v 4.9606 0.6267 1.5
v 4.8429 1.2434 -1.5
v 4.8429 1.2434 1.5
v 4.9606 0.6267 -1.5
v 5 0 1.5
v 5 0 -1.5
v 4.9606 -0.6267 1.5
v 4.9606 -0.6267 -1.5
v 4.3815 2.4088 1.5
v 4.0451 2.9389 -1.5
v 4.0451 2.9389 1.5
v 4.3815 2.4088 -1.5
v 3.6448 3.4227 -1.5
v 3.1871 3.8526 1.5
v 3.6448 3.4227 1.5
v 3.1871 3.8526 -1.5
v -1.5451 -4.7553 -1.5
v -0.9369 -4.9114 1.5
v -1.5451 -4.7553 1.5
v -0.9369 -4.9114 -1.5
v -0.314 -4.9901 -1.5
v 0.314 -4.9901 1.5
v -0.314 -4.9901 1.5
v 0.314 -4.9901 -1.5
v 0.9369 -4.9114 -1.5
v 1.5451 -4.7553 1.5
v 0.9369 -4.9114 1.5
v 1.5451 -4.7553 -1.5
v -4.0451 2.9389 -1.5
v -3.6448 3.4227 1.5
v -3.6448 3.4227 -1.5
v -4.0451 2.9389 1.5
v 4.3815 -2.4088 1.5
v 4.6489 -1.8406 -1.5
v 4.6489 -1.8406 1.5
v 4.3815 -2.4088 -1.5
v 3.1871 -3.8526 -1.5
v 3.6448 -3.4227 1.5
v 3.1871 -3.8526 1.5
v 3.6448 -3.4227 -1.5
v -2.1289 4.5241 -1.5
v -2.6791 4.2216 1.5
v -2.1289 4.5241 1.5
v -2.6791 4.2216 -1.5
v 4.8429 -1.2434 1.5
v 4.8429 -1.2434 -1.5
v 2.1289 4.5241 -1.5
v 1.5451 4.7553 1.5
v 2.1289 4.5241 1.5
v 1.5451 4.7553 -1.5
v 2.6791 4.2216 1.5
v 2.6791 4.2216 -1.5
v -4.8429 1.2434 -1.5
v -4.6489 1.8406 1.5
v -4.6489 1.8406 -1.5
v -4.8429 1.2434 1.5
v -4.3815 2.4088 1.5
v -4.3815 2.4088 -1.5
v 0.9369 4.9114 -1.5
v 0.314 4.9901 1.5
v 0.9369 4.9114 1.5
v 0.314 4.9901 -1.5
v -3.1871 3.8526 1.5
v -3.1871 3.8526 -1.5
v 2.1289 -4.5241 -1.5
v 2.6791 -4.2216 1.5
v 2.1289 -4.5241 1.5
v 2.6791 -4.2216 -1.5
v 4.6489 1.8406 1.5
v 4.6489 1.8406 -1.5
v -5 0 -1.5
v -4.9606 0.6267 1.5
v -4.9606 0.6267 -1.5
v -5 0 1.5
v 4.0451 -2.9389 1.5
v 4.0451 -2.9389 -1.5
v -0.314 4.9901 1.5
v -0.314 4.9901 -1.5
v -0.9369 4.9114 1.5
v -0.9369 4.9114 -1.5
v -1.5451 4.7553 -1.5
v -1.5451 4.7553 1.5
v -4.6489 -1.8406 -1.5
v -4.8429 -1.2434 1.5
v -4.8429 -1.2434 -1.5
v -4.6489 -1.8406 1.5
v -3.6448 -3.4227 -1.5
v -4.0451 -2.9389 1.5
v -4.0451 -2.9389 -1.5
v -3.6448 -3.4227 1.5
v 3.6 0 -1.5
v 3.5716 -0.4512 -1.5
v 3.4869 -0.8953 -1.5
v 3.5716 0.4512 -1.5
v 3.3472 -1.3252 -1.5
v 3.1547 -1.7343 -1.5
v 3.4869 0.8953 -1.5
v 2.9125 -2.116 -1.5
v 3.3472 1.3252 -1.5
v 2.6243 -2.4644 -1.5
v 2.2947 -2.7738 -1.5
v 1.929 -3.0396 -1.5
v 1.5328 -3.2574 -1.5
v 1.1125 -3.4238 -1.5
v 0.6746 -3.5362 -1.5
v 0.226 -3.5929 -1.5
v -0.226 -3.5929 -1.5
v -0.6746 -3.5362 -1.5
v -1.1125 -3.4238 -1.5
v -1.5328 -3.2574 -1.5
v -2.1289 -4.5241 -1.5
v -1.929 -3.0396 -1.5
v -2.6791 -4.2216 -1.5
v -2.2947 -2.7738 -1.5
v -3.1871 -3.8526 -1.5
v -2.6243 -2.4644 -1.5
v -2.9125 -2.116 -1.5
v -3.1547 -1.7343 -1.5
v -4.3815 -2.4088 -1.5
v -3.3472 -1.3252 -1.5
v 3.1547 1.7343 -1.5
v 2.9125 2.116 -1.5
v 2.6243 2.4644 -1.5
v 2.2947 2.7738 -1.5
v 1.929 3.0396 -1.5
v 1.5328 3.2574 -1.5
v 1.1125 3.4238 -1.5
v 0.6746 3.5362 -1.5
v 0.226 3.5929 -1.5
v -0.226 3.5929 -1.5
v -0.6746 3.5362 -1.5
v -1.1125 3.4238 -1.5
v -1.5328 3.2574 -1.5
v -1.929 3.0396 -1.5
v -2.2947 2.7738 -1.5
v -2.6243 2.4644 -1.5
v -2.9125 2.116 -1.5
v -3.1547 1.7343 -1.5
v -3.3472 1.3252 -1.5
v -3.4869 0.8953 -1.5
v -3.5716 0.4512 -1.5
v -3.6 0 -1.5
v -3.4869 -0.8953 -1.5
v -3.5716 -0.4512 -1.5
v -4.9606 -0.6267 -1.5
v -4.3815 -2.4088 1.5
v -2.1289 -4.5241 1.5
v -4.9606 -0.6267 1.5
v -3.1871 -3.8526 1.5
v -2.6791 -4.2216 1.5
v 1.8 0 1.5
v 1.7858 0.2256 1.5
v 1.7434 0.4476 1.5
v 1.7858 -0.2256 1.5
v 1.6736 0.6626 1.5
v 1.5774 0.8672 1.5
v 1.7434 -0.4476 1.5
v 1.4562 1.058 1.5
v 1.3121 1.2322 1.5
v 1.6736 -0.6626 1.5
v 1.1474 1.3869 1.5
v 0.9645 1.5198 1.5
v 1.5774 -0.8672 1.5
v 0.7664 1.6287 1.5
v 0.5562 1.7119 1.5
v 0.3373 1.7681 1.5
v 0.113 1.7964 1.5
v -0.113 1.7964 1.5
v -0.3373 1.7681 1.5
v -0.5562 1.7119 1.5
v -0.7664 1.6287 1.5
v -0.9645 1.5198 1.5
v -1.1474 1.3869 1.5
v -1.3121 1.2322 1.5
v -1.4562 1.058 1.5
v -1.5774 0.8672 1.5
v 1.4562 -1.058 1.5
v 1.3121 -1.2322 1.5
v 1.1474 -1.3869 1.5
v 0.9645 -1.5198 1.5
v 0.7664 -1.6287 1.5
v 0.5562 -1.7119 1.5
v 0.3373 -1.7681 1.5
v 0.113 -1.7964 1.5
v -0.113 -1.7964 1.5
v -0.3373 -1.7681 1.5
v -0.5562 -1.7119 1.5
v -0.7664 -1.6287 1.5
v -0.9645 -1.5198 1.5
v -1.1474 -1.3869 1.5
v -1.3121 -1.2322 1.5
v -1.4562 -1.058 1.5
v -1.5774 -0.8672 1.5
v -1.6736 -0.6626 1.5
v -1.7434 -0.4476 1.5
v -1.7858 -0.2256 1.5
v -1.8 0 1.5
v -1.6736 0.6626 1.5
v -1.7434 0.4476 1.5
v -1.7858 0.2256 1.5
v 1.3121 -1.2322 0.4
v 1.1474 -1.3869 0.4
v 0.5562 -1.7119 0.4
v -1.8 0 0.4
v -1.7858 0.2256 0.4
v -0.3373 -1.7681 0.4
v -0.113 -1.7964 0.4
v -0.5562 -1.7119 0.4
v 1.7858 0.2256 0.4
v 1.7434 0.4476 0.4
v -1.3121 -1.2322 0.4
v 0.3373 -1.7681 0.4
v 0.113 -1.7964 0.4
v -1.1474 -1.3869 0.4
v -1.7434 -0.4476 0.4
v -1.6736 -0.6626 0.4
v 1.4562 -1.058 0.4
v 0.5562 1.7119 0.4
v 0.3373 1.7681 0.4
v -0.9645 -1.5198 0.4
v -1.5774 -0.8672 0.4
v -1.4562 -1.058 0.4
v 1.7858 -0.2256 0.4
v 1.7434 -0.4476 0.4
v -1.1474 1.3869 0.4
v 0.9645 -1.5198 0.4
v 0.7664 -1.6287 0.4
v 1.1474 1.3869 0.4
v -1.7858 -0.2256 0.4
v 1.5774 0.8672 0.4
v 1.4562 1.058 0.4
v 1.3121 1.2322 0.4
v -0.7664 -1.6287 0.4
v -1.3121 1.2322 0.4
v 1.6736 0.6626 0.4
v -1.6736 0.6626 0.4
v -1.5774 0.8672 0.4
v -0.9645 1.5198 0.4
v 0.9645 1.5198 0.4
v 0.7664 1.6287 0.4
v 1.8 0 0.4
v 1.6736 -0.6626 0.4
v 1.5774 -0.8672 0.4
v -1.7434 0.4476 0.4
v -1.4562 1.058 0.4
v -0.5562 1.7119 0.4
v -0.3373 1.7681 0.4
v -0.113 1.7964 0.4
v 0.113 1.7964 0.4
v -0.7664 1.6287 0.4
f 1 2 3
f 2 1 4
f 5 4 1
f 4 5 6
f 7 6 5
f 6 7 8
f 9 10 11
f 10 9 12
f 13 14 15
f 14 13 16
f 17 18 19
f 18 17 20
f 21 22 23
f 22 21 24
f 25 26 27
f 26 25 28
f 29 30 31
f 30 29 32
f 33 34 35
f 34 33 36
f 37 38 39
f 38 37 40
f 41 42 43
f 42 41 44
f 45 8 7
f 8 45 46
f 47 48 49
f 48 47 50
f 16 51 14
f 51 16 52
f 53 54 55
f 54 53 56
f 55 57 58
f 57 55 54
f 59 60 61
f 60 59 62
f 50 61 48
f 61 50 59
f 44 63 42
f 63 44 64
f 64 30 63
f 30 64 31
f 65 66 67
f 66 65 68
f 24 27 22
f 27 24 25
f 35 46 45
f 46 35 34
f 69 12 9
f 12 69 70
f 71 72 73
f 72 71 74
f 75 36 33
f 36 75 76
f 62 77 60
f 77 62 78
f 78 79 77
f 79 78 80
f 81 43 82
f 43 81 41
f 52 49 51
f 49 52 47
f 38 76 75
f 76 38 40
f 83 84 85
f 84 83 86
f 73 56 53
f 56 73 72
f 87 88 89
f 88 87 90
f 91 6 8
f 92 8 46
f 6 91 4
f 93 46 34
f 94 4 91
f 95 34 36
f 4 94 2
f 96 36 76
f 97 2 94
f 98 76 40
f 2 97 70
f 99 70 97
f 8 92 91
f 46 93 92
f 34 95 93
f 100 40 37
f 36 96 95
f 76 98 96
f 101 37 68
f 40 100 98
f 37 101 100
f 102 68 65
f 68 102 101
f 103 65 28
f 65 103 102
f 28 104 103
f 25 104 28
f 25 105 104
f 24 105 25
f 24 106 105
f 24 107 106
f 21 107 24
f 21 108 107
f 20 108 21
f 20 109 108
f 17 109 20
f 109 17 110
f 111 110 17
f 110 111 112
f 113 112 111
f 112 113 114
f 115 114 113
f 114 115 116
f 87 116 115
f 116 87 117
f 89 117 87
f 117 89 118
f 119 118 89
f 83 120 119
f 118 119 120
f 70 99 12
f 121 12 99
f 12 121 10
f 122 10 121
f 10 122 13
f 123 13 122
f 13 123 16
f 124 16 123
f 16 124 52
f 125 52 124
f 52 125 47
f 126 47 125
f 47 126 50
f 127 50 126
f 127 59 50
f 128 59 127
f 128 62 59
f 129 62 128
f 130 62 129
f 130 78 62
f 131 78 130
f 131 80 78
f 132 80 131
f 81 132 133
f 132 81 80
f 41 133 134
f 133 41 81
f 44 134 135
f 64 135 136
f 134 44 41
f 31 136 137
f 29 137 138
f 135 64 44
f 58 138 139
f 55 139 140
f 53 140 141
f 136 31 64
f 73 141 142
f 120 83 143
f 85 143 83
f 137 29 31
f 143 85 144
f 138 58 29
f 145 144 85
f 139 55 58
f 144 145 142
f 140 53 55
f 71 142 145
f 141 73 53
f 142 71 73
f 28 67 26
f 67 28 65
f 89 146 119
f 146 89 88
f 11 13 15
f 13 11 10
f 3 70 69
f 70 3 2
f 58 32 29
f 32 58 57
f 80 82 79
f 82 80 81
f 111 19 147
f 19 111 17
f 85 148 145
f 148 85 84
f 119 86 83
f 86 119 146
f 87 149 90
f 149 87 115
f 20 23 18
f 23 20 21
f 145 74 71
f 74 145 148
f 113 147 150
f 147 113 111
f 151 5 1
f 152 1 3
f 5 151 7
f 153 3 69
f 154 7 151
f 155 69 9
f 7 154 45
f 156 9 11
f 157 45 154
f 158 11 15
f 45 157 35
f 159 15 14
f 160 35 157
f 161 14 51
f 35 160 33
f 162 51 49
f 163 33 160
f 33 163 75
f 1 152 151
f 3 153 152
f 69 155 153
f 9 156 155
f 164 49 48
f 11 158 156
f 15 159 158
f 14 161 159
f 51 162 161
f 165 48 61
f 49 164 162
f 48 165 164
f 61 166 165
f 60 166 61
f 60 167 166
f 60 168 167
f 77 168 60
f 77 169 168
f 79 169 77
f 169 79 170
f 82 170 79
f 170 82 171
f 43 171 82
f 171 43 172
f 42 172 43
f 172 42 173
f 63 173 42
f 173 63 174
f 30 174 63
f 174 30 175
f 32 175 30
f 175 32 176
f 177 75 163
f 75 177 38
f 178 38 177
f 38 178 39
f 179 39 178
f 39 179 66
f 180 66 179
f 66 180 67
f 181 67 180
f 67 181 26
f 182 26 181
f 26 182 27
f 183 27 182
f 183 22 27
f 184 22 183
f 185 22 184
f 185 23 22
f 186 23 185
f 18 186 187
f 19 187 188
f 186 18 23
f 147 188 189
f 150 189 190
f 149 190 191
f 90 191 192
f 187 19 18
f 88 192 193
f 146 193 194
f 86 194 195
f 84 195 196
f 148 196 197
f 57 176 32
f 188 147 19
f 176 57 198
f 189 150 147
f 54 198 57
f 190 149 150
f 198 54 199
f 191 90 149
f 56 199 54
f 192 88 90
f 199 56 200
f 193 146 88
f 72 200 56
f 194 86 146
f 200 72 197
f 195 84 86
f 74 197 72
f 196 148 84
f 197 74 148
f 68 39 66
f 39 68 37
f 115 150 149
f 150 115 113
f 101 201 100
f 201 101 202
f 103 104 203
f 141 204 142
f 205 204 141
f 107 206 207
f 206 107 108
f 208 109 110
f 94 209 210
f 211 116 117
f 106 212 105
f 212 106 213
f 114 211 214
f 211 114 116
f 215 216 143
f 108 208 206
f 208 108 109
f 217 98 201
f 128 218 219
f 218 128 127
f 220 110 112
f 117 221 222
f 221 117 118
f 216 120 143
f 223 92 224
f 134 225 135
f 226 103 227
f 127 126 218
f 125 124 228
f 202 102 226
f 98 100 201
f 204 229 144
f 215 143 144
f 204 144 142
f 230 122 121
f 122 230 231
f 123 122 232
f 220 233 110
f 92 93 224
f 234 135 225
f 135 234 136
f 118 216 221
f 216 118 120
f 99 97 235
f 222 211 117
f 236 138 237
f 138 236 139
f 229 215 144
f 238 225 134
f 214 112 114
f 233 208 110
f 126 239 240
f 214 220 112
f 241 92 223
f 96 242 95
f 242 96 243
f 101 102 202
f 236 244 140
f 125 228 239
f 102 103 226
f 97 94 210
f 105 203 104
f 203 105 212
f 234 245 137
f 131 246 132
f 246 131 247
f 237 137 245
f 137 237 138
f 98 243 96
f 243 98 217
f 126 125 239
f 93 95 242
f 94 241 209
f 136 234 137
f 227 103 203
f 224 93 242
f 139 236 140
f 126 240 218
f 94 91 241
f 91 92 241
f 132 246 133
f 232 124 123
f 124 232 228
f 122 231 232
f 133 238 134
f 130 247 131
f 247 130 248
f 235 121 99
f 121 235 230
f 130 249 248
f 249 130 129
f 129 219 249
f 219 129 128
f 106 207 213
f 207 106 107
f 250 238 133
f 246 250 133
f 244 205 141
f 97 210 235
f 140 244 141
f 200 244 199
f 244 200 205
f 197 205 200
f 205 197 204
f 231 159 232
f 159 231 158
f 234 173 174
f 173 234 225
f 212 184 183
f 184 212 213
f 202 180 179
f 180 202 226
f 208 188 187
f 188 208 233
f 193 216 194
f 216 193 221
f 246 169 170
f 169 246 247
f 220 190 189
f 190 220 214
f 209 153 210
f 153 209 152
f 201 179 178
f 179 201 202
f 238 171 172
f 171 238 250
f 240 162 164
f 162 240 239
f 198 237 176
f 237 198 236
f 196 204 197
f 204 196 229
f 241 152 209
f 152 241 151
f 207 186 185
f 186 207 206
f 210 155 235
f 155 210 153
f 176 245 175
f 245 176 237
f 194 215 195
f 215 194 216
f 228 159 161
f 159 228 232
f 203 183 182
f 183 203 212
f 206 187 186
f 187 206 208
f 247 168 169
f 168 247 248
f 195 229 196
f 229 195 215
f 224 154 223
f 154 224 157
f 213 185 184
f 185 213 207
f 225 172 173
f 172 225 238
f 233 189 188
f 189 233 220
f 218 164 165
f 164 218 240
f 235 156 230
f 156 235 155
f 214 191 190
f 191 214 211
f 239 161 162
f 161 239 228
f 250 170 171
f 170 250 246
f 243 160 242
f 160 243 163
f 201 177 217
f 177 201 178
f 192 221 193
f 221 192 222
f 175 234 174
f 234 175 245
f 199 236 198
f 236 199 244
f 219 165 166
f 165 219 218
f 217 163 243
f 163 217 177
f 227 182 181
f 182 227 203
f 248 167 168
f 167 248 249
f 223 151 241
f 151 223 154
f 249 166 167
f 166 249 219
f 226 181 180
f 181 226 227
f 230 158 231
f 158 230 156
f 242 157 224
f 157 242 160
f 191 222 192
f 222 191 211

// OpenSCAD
$fn = 50;


difference() {
	union() {
		translate(v = [0, 0, -1.5000000000]) {
			cylinder(h = 3, r = 5.0000000000);
		}
		translate(v = [0, 0, -1.5000000000]) {
			cylinder(h = 3, r = 2.8500000000);
		}
	}
	union() {
		translate(v = [0, 0, -1.5000000000]) {
			rotate(a = [0, 180, 0]) {
				difference() {
					union() {
						translate(v = [0, 0, -3.0000000000]) {
							cylinder(h = 3, r = 1.5000000000);
						}
						translate(v = [0, 0, -1.9000000000]) {
							cylinder(h = 1.9000000000, r1 = 1.8000000000, r2 = 3.6000000000);
						}
						translate(v = [0, 0, -3.0000000000]) {
							cylinder(h = 3, r = 1.8000000000);
						}
						translate(v = [0, 0, -3.0000000000]) {
							cylinder(h = 3, r = 1.5000000000);
						}
					}
					union();
				}
			}
		}
		translate(v = [0, 0, -100.0000000000]) {
			cylinder(h = 200, r = 1.8000000000);
		}
	}
}
